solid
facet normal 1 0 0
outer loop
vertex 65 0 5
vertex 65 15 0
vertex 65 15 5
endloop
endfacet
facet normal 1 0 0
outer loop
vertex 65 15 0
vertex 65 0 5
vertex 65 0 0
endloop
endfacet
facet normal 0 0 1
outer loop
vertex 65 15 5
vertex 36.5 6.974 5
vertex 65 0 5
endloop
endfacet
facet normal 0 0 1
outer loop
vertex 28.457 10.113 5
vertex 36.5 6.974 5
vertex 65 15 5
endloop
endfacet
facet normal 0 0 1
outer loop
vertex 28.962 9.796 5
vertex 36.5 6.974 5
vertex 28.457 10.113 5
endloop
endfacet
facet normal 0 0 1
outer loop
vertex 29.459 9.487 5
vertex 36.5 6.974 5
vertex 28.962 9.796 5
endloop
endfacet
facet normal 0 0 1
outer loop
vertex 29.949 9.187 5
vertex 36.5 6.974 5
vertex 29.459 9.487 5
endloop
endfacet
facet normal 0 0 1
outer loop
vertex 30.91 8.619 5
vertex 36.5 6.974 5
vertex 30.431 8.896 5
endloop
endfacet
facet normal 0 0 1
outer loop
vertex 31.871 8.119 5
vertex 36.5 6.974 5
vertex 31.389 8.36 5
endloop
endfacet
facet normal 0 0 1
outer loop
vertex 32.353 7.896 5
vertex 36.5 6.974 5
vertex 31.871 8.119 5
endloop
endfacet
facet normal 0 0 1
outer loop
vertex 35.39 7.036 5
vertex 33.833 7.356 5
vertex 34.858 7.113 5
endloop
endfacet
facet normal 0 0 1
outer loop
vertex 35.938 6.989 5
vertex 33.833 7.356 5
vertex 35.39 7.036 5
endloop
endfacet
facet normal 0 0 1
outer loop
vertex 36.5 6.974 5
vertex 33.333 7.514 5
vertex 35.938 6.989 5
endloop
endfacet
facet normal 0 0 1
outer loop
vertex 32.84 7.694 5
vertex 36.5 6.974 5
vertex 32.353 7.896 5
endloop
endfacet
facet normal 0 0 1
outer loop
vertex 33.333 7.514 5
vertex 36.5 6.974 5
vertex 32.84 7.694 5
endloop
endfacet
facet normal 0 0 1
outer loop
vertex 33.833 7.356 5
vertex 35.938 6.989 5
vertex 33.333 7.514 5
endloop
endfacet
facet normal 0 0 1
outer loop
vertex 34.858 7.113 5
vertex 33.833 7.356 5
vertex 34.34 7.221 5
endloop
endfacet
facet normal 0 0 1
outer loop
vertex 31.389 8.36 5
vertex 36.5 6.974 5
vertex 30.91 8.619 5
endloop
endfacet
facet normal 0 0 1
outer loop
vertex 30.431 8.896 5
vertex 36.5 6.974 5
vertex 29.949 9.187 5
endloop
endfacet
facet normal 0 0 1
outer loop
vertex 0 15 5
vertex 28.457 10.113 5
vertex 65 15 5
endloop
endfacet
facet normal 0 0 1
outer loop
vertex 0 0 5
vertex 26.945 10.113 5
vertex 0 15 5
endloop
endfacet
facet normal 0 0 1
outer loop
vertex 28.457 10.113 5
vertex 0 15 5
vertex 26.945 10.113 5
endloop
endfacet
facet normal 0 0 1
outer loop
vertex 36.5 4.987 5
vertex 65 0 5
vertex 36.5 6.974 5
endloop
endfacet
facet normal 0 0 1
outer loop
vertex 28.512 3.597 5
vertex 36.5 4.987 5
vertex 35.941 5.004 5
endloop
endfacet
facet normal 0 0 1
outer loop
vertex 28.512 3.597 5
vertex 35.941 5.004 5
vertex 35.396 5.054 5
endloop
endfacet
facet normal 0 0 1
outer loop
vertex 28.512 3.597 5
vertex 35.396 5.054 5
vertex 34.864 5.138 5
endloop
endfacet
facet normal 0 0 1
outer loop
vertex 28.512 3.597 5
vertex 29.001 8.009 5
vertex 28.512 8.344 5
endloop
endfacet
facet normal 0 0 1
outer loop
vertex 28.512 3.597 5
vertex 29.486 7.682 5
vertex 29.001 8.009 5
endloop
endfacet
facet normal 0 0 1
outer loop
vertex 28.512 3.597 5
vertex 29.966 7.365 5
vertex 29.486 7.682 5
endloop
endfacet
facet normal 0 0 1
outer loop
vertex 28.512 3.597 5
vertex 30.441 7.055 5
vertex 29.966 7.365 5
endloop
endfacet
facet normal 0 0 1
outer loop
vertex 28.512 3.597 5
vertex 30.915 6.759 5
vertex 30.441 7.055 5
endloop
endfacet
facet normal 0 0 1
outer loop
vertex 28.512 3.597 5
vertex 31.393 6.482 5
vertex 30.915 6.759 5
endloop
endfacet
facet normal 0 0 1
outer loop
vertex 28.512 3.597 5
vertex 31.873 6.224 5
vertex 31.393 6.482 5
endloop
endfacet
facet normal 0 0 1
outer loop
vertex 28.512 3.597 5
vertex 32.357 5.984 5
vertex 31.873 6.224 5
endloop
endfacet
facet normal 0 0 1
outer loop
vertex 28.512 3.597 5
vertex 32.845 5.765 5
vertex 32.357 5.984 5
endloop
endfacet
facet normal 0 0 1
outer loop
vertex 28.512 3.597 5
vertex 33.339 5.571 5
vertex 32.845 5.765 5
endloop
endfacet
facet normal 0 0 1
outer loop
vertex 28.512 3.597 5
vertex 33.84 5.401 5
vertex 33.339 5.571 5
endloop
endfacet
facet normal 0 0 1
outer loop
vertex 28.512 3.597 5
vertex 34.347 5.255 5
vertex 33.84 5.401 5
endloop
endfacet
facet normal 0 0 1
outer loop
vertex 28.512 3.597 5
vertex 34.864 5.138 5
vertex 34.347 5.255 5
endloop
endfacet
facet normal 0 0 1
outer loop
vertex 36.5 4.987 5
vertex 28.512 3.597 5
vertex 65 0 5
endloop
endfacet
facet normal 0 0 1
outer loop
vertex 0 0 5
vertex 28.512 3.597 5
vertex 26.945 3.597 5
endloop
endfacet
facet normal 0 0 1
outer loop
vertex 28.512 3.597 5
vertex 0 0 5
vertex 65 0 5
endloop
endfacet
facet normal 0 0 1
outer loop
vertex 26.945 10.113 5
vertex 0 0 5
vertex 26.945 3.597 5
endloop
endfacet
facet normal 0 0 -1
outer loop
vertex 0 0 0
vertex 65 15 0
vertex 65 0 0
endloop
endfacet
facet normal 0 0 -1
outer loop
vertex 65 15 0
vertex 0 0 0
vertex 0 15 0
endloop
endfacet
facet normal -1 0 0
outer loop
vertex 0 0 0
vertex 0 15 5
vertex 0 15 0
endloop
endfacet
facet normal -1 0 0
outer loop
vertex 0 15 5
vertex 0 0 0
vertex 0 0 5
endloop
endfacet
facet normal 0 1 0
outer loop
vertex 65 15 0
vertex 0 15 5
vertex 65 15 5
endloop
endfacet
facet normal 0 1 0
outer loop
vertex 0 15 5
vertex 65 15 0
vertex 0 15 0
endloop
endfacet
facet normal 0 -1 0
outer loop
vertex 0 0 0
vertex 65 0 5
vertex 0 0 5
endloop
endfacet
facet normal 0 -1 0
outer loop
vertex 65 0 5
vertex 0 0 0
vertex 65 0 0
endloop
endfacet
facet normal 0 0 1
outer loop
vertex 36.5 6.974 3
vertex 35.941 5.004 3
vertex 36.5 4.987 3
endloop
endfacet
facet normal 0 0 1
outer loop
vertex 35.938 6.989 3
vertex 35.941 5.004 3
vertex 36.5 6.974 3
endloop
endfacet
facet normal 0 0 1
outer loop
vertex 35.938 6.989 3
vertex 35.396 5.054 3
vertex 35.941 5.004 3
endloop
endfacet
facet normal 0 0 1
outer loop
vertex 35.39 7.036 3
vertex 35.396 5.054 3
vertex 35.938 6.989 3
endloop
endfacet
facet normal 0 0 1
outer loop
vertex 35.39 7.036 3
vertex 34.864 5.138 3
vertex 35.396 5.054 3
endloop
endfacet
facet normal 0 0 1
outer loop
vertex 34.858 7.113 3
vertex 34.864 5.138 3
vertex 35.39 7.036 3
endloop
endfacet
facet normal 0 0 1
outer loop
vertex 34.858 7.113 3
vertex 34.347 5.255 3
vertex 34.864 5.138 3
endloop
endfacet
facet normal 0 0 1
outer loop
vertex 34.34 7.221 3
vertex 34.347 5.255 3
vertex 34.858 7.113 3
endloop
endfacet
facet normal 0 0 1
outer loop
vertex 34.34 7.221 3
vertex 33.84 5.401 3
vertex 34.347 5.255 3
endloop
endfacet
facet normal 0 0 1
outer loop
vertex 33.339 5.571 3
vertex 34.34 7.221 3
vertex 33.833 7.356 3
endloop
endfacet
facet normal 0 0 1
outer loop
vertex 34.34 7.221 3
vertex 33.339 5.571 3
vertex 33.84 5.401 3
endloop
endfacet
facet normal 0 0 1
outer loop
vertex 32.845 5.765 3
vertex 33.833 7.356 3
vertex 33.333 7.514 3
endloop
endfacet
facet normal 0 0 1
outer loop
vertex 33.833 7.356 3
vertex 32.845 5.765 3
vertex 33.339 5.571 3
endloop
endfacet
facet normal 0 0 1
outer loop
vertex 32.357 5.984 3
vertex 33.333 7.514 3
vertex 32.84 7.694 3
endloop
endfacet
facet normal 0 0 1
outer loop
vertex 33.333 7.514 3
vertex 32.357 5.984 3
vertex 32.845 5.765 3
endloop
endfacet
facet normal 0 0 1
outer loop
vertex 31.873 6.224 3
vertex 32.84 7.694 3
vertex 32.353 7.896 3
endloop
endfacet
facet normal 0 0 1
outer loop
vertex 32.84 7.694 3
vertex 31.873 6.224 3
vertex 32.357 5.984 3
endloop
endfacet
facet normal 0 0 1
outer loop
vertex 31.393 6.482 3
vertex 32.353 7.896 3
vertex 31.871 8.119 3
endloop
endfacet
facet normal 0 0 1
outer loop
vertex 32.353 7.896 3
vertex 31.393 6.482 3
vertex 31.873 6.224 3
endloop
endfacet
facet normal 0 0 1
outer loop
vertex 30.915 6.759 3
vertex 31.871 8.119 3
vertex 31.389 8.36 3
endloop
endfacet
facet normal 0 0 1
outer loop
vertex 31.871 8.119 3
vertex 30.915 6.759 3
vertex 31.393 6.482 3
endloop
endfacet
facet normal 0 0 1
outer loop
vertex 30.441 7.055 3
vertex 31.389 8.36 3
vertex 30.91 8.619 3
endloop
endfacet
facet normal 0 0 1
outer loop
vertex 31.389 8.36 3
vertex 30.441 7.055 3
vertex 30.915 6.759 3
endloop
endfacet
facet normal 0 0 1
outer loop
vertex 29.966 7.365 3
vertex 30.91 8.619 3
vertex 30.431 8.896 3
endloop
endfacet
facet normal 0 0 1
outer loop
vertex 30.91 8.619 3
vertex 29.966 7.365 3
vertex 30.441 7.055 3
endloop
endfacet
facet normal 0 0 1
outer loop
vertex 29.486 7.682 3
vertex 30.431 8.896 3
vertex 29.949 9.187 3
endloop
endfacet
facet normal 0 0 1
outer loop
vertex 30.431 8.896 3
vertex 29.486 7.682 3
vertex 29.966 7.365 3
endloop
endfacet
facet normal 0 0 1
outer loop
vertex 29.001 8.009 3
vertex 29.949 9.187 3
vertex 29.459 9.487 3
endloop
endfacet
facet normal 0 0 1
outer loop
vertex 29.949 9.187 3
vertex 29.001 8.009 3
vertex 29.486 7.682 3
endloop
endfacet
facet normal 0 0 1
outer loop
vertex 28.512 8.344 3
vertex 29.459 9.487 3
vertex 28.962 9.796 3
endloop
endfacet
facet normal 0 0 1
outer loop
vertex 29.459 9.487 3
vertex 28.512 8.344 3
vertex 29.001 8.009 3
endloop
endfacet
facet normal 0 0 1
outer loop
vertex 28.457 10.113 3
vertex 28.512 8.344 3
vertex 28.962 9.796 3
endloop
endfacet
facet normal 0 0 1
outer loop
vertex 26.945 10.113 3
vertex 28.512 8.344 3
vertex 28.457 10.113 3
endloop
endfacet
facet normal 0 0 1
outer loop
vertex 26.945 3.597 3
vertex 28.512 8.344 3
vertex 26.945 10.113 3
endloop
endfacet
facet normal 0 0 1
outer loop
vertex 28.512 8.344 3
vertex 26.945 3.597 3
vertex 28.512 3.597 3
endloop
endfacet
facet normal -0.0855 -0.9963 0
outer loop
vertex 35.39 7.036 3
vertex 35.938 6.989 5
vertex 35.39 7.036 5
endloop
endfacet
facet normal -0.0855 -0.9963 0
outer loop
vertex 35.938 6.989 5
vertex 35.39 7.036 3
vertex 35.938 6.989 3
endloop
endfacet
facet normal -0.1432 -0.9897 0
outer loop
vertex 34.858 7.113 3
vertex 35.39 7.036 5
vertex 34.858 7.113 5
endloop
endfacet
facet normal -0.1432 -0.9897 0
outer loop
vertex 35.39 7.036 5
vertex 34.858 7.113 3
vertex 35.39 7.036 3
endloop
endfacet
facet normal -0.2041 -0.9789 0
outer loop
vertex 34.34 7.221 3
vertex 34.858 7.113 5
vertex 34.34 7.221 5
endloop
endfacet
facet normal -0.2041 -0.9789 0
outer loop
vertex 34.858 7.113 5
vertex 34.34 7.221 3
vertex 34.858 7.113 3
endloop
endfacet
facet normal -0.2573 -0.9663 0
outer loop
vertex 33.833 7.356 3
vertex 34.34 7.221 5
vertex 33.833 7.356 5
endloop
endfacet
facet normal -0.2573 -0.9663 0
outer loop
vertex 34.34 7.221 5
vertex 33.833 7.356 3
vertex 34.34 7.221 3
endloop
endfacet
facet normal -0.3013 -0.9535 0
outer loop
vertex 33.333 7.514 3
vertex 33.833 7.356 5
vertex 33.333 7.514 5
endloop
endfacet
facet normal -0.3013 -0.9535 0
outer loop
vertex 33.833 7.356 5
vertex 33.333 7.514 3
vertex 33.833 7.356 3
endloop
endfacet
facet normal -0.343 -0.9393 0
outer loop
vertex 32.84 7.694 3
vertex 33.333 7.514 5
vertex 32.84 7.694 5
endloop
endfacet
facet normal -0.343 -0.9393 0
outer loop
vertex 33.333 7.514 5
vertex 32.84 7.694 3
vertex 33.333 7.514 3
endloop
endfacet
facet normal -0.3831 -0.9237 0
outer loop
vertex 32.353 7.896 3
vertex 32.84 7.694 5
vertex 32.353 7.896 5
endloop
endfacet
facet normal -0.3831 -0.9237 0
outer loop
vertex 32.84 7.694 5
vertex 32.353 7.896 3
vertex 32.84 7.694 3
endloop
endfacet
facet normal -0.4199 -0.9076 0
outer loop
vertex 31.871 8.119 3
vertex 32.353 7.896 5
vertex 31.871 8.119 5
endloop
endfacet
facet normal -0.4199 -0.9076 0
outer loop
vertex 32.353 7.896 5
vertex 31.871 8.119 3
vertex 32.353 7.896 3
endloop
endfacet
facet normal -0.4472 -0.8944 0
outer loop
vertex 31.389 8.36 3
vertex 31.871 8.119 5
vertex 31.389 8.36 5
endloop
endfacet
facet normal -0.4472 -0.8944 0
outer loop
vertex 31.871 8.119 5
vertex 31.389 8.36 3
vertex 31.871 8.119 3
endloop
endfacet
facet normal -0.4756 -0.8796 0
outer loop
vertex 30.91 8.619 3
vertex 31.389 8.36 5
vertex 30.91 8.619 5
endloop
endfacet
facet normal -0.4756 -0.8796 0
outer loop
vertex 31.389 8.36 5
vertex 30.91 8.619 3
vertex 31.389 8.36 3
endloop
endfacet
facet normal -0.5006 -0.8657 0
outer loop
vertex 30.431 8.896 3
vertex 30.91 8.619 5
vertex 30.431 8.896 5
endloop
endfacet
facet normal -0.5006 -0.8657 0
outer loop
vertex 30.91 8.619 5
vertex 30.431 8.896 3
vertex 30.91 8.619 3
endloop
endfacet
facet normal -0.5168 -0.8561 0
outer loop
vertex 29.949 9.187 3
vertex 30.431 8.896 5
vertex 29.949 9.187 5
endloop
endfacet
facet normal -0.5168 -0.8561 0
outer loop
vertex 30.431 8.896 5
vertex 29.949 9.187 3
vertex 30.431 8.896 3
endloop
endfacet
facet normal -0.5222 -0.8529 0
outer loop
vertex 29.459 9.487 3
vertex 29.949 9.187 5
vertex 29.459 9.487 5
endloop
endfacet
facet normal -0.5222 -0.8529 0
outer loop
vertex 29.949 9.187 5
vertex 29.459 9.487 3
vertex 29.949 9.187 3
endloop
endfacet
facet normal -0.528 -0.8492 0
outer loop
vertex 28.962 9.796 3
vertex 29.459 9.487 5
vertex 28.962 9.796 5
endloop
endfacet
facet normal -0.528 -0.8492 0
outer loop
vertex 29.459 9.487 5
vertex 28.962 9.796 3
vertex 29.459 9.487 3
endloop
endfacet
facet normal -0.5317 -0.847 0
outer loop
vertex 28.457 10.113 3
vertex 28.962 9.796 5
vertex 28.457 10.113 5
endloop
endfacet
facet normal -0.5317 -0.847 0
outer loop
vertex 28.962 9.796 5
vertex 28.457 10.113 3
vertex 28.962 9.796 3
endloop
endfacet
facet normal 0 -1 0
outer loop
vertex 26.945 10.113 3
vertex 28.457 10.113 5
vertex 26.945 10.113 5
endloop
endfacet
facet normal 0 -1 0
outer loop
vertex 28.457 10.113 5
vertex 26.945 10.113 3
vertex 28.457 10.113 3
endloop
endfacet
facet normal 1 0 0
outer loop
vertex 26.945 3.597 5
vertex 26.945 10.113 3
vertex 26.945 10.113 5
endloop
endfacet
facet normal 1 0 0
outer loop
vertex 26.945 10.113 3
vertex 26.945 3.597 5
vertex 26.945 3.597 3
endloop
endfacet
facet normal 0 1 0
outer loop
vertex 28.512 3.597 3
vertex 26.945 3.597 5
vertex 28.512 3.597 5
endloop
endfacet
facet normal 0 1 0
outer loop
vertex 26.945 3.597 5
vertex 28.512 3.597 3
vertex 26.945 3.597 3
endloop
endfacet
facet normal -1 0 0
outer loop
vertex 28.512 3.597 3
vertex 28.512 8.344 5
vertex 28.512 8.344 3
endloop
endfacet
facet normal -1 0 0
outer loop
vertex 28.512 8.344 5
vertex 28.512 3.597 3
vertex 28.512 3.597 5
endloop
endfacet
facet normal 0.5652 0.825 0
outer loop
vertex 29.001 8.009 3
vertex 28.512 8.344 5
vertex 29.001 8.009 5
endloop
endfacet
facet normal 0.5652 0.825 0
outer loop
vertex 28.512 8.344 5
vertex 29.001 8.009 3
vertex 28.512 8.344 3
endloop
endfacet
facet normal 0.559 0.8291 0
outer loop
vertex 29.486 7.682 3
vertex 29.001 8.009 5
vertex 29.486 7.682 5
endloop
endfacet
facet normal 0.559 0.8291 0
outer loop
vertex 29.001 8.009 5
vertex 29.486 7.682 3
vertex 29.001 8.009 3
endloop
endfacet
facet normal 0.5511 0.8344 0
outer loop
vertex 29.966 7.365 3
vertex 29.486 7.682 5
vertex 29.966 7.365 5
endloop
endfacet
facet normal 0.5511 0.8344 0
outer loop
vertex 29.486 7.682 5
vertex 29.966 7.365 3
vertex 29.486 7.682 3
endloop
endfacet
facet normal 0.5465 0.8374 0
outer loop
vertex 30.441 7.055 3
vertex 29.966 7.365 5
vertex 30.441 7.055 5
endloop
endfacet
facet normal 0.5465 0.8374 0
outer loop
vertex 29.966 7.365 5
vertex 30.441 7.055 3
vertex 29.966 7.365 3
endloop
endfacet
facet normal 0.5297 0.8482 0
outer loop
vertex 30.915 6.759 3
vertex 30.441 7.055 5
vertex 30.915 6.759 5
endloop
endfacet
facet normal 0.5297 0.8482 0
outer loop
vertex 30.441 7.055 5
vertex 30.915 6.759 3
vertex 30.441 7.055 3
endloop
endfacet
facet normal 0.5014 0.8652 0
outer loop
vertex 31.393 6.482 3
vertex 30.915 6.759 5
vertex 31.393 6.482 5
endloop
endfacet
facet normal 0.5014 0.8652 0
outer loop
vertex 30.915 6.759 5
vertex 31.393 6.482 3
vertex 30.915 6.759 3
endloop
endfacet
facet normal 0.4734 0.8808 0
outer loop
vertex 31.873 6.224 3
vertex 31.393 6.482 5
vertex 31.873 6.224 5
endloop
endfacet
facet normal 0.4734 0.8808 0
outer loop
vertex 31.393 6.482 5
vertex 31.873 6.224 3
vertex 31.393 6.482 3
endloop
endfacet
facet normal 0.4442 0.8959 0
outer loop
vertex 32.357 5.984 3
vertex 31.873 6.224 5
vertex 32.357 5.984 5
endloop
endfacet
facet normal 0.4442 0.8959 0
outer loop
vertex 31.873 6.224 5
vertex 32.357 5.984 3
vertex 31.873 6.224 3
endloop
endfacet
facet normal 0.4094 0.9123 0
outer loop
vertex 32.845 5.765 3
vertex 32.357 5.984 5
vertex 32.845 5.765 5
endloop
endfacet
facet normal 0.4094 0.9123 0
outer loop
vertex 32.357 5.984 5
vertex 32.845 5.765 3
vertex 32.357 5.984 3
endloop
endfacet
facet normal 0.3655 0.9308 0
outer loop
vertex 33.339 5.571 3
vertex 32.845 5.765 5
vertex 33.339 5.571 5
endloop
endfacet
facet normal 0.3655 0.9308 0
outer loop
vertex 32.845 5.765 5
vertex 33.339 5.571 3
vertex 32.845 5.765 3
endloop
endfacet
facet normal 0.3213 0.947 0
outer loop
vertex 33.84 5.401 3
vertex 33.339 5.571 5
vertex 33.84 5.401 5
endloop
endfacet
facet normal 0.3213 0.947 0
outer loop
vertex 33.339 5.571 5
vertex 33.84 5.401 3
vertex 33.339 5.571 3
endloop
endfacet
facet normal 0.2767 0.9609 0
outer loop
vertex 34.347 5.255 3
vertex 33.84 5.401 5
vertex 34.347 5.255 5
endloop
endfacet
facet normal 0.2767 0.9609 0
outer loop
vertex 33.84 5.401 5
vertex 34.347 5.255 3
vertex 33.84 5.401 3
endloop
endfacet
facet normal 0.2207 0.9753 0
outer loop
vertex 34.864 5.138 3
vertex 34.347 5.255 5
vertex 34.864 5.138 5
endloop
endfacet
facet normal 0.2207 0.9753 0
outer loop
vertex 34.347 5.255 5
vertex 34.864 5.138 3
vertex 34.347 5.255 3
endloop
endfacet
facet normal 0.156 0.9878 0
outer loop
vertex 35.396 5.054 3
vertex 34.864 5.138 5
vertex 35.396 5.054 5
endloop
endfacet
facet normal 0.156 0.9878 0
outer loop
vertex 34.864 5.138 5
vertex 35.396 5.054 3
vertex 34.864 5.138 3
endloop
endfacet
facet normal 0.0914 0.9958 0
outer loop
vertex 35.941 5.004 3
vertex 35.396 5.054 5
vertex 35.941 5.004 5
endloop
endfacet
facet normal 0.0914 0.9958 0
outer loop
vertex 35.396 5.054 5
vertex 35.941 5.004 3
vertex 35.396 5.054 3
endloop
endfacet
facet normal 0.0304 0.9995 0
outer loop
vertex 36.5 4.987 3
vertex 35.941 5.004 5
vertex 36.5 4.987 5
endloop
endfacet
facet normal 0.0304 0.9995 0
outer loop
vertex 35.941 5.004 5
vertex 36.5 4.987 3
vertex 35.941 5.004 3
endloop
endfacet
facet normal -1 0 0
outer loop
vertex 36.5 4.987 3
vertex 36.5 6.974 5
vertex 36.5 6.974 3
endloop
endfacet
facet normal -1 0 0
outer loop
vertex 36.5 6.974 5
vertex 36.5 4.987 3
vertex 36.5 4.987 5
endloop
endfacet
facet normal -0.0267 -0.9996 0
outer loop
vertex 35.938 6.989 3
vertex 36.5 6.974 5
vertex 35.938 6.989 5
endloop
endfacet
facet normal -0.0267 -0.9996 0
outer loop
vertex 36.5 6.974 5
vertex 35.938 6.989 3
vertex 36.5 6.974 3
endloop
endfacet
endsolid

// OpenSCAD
difference(){
	union(){ 
        translate([0,0,0]){
           cube([65,15,5], center=false);
        }                
	}
	union() {
        translate([60-65/2+9, 3,3]){
            linear_extrude(height = 10) {
                rotate([0,0,90]){
                    text("7", size = 10, font="Arial:style=Bold");
                }
            }
        }                


	}
}
